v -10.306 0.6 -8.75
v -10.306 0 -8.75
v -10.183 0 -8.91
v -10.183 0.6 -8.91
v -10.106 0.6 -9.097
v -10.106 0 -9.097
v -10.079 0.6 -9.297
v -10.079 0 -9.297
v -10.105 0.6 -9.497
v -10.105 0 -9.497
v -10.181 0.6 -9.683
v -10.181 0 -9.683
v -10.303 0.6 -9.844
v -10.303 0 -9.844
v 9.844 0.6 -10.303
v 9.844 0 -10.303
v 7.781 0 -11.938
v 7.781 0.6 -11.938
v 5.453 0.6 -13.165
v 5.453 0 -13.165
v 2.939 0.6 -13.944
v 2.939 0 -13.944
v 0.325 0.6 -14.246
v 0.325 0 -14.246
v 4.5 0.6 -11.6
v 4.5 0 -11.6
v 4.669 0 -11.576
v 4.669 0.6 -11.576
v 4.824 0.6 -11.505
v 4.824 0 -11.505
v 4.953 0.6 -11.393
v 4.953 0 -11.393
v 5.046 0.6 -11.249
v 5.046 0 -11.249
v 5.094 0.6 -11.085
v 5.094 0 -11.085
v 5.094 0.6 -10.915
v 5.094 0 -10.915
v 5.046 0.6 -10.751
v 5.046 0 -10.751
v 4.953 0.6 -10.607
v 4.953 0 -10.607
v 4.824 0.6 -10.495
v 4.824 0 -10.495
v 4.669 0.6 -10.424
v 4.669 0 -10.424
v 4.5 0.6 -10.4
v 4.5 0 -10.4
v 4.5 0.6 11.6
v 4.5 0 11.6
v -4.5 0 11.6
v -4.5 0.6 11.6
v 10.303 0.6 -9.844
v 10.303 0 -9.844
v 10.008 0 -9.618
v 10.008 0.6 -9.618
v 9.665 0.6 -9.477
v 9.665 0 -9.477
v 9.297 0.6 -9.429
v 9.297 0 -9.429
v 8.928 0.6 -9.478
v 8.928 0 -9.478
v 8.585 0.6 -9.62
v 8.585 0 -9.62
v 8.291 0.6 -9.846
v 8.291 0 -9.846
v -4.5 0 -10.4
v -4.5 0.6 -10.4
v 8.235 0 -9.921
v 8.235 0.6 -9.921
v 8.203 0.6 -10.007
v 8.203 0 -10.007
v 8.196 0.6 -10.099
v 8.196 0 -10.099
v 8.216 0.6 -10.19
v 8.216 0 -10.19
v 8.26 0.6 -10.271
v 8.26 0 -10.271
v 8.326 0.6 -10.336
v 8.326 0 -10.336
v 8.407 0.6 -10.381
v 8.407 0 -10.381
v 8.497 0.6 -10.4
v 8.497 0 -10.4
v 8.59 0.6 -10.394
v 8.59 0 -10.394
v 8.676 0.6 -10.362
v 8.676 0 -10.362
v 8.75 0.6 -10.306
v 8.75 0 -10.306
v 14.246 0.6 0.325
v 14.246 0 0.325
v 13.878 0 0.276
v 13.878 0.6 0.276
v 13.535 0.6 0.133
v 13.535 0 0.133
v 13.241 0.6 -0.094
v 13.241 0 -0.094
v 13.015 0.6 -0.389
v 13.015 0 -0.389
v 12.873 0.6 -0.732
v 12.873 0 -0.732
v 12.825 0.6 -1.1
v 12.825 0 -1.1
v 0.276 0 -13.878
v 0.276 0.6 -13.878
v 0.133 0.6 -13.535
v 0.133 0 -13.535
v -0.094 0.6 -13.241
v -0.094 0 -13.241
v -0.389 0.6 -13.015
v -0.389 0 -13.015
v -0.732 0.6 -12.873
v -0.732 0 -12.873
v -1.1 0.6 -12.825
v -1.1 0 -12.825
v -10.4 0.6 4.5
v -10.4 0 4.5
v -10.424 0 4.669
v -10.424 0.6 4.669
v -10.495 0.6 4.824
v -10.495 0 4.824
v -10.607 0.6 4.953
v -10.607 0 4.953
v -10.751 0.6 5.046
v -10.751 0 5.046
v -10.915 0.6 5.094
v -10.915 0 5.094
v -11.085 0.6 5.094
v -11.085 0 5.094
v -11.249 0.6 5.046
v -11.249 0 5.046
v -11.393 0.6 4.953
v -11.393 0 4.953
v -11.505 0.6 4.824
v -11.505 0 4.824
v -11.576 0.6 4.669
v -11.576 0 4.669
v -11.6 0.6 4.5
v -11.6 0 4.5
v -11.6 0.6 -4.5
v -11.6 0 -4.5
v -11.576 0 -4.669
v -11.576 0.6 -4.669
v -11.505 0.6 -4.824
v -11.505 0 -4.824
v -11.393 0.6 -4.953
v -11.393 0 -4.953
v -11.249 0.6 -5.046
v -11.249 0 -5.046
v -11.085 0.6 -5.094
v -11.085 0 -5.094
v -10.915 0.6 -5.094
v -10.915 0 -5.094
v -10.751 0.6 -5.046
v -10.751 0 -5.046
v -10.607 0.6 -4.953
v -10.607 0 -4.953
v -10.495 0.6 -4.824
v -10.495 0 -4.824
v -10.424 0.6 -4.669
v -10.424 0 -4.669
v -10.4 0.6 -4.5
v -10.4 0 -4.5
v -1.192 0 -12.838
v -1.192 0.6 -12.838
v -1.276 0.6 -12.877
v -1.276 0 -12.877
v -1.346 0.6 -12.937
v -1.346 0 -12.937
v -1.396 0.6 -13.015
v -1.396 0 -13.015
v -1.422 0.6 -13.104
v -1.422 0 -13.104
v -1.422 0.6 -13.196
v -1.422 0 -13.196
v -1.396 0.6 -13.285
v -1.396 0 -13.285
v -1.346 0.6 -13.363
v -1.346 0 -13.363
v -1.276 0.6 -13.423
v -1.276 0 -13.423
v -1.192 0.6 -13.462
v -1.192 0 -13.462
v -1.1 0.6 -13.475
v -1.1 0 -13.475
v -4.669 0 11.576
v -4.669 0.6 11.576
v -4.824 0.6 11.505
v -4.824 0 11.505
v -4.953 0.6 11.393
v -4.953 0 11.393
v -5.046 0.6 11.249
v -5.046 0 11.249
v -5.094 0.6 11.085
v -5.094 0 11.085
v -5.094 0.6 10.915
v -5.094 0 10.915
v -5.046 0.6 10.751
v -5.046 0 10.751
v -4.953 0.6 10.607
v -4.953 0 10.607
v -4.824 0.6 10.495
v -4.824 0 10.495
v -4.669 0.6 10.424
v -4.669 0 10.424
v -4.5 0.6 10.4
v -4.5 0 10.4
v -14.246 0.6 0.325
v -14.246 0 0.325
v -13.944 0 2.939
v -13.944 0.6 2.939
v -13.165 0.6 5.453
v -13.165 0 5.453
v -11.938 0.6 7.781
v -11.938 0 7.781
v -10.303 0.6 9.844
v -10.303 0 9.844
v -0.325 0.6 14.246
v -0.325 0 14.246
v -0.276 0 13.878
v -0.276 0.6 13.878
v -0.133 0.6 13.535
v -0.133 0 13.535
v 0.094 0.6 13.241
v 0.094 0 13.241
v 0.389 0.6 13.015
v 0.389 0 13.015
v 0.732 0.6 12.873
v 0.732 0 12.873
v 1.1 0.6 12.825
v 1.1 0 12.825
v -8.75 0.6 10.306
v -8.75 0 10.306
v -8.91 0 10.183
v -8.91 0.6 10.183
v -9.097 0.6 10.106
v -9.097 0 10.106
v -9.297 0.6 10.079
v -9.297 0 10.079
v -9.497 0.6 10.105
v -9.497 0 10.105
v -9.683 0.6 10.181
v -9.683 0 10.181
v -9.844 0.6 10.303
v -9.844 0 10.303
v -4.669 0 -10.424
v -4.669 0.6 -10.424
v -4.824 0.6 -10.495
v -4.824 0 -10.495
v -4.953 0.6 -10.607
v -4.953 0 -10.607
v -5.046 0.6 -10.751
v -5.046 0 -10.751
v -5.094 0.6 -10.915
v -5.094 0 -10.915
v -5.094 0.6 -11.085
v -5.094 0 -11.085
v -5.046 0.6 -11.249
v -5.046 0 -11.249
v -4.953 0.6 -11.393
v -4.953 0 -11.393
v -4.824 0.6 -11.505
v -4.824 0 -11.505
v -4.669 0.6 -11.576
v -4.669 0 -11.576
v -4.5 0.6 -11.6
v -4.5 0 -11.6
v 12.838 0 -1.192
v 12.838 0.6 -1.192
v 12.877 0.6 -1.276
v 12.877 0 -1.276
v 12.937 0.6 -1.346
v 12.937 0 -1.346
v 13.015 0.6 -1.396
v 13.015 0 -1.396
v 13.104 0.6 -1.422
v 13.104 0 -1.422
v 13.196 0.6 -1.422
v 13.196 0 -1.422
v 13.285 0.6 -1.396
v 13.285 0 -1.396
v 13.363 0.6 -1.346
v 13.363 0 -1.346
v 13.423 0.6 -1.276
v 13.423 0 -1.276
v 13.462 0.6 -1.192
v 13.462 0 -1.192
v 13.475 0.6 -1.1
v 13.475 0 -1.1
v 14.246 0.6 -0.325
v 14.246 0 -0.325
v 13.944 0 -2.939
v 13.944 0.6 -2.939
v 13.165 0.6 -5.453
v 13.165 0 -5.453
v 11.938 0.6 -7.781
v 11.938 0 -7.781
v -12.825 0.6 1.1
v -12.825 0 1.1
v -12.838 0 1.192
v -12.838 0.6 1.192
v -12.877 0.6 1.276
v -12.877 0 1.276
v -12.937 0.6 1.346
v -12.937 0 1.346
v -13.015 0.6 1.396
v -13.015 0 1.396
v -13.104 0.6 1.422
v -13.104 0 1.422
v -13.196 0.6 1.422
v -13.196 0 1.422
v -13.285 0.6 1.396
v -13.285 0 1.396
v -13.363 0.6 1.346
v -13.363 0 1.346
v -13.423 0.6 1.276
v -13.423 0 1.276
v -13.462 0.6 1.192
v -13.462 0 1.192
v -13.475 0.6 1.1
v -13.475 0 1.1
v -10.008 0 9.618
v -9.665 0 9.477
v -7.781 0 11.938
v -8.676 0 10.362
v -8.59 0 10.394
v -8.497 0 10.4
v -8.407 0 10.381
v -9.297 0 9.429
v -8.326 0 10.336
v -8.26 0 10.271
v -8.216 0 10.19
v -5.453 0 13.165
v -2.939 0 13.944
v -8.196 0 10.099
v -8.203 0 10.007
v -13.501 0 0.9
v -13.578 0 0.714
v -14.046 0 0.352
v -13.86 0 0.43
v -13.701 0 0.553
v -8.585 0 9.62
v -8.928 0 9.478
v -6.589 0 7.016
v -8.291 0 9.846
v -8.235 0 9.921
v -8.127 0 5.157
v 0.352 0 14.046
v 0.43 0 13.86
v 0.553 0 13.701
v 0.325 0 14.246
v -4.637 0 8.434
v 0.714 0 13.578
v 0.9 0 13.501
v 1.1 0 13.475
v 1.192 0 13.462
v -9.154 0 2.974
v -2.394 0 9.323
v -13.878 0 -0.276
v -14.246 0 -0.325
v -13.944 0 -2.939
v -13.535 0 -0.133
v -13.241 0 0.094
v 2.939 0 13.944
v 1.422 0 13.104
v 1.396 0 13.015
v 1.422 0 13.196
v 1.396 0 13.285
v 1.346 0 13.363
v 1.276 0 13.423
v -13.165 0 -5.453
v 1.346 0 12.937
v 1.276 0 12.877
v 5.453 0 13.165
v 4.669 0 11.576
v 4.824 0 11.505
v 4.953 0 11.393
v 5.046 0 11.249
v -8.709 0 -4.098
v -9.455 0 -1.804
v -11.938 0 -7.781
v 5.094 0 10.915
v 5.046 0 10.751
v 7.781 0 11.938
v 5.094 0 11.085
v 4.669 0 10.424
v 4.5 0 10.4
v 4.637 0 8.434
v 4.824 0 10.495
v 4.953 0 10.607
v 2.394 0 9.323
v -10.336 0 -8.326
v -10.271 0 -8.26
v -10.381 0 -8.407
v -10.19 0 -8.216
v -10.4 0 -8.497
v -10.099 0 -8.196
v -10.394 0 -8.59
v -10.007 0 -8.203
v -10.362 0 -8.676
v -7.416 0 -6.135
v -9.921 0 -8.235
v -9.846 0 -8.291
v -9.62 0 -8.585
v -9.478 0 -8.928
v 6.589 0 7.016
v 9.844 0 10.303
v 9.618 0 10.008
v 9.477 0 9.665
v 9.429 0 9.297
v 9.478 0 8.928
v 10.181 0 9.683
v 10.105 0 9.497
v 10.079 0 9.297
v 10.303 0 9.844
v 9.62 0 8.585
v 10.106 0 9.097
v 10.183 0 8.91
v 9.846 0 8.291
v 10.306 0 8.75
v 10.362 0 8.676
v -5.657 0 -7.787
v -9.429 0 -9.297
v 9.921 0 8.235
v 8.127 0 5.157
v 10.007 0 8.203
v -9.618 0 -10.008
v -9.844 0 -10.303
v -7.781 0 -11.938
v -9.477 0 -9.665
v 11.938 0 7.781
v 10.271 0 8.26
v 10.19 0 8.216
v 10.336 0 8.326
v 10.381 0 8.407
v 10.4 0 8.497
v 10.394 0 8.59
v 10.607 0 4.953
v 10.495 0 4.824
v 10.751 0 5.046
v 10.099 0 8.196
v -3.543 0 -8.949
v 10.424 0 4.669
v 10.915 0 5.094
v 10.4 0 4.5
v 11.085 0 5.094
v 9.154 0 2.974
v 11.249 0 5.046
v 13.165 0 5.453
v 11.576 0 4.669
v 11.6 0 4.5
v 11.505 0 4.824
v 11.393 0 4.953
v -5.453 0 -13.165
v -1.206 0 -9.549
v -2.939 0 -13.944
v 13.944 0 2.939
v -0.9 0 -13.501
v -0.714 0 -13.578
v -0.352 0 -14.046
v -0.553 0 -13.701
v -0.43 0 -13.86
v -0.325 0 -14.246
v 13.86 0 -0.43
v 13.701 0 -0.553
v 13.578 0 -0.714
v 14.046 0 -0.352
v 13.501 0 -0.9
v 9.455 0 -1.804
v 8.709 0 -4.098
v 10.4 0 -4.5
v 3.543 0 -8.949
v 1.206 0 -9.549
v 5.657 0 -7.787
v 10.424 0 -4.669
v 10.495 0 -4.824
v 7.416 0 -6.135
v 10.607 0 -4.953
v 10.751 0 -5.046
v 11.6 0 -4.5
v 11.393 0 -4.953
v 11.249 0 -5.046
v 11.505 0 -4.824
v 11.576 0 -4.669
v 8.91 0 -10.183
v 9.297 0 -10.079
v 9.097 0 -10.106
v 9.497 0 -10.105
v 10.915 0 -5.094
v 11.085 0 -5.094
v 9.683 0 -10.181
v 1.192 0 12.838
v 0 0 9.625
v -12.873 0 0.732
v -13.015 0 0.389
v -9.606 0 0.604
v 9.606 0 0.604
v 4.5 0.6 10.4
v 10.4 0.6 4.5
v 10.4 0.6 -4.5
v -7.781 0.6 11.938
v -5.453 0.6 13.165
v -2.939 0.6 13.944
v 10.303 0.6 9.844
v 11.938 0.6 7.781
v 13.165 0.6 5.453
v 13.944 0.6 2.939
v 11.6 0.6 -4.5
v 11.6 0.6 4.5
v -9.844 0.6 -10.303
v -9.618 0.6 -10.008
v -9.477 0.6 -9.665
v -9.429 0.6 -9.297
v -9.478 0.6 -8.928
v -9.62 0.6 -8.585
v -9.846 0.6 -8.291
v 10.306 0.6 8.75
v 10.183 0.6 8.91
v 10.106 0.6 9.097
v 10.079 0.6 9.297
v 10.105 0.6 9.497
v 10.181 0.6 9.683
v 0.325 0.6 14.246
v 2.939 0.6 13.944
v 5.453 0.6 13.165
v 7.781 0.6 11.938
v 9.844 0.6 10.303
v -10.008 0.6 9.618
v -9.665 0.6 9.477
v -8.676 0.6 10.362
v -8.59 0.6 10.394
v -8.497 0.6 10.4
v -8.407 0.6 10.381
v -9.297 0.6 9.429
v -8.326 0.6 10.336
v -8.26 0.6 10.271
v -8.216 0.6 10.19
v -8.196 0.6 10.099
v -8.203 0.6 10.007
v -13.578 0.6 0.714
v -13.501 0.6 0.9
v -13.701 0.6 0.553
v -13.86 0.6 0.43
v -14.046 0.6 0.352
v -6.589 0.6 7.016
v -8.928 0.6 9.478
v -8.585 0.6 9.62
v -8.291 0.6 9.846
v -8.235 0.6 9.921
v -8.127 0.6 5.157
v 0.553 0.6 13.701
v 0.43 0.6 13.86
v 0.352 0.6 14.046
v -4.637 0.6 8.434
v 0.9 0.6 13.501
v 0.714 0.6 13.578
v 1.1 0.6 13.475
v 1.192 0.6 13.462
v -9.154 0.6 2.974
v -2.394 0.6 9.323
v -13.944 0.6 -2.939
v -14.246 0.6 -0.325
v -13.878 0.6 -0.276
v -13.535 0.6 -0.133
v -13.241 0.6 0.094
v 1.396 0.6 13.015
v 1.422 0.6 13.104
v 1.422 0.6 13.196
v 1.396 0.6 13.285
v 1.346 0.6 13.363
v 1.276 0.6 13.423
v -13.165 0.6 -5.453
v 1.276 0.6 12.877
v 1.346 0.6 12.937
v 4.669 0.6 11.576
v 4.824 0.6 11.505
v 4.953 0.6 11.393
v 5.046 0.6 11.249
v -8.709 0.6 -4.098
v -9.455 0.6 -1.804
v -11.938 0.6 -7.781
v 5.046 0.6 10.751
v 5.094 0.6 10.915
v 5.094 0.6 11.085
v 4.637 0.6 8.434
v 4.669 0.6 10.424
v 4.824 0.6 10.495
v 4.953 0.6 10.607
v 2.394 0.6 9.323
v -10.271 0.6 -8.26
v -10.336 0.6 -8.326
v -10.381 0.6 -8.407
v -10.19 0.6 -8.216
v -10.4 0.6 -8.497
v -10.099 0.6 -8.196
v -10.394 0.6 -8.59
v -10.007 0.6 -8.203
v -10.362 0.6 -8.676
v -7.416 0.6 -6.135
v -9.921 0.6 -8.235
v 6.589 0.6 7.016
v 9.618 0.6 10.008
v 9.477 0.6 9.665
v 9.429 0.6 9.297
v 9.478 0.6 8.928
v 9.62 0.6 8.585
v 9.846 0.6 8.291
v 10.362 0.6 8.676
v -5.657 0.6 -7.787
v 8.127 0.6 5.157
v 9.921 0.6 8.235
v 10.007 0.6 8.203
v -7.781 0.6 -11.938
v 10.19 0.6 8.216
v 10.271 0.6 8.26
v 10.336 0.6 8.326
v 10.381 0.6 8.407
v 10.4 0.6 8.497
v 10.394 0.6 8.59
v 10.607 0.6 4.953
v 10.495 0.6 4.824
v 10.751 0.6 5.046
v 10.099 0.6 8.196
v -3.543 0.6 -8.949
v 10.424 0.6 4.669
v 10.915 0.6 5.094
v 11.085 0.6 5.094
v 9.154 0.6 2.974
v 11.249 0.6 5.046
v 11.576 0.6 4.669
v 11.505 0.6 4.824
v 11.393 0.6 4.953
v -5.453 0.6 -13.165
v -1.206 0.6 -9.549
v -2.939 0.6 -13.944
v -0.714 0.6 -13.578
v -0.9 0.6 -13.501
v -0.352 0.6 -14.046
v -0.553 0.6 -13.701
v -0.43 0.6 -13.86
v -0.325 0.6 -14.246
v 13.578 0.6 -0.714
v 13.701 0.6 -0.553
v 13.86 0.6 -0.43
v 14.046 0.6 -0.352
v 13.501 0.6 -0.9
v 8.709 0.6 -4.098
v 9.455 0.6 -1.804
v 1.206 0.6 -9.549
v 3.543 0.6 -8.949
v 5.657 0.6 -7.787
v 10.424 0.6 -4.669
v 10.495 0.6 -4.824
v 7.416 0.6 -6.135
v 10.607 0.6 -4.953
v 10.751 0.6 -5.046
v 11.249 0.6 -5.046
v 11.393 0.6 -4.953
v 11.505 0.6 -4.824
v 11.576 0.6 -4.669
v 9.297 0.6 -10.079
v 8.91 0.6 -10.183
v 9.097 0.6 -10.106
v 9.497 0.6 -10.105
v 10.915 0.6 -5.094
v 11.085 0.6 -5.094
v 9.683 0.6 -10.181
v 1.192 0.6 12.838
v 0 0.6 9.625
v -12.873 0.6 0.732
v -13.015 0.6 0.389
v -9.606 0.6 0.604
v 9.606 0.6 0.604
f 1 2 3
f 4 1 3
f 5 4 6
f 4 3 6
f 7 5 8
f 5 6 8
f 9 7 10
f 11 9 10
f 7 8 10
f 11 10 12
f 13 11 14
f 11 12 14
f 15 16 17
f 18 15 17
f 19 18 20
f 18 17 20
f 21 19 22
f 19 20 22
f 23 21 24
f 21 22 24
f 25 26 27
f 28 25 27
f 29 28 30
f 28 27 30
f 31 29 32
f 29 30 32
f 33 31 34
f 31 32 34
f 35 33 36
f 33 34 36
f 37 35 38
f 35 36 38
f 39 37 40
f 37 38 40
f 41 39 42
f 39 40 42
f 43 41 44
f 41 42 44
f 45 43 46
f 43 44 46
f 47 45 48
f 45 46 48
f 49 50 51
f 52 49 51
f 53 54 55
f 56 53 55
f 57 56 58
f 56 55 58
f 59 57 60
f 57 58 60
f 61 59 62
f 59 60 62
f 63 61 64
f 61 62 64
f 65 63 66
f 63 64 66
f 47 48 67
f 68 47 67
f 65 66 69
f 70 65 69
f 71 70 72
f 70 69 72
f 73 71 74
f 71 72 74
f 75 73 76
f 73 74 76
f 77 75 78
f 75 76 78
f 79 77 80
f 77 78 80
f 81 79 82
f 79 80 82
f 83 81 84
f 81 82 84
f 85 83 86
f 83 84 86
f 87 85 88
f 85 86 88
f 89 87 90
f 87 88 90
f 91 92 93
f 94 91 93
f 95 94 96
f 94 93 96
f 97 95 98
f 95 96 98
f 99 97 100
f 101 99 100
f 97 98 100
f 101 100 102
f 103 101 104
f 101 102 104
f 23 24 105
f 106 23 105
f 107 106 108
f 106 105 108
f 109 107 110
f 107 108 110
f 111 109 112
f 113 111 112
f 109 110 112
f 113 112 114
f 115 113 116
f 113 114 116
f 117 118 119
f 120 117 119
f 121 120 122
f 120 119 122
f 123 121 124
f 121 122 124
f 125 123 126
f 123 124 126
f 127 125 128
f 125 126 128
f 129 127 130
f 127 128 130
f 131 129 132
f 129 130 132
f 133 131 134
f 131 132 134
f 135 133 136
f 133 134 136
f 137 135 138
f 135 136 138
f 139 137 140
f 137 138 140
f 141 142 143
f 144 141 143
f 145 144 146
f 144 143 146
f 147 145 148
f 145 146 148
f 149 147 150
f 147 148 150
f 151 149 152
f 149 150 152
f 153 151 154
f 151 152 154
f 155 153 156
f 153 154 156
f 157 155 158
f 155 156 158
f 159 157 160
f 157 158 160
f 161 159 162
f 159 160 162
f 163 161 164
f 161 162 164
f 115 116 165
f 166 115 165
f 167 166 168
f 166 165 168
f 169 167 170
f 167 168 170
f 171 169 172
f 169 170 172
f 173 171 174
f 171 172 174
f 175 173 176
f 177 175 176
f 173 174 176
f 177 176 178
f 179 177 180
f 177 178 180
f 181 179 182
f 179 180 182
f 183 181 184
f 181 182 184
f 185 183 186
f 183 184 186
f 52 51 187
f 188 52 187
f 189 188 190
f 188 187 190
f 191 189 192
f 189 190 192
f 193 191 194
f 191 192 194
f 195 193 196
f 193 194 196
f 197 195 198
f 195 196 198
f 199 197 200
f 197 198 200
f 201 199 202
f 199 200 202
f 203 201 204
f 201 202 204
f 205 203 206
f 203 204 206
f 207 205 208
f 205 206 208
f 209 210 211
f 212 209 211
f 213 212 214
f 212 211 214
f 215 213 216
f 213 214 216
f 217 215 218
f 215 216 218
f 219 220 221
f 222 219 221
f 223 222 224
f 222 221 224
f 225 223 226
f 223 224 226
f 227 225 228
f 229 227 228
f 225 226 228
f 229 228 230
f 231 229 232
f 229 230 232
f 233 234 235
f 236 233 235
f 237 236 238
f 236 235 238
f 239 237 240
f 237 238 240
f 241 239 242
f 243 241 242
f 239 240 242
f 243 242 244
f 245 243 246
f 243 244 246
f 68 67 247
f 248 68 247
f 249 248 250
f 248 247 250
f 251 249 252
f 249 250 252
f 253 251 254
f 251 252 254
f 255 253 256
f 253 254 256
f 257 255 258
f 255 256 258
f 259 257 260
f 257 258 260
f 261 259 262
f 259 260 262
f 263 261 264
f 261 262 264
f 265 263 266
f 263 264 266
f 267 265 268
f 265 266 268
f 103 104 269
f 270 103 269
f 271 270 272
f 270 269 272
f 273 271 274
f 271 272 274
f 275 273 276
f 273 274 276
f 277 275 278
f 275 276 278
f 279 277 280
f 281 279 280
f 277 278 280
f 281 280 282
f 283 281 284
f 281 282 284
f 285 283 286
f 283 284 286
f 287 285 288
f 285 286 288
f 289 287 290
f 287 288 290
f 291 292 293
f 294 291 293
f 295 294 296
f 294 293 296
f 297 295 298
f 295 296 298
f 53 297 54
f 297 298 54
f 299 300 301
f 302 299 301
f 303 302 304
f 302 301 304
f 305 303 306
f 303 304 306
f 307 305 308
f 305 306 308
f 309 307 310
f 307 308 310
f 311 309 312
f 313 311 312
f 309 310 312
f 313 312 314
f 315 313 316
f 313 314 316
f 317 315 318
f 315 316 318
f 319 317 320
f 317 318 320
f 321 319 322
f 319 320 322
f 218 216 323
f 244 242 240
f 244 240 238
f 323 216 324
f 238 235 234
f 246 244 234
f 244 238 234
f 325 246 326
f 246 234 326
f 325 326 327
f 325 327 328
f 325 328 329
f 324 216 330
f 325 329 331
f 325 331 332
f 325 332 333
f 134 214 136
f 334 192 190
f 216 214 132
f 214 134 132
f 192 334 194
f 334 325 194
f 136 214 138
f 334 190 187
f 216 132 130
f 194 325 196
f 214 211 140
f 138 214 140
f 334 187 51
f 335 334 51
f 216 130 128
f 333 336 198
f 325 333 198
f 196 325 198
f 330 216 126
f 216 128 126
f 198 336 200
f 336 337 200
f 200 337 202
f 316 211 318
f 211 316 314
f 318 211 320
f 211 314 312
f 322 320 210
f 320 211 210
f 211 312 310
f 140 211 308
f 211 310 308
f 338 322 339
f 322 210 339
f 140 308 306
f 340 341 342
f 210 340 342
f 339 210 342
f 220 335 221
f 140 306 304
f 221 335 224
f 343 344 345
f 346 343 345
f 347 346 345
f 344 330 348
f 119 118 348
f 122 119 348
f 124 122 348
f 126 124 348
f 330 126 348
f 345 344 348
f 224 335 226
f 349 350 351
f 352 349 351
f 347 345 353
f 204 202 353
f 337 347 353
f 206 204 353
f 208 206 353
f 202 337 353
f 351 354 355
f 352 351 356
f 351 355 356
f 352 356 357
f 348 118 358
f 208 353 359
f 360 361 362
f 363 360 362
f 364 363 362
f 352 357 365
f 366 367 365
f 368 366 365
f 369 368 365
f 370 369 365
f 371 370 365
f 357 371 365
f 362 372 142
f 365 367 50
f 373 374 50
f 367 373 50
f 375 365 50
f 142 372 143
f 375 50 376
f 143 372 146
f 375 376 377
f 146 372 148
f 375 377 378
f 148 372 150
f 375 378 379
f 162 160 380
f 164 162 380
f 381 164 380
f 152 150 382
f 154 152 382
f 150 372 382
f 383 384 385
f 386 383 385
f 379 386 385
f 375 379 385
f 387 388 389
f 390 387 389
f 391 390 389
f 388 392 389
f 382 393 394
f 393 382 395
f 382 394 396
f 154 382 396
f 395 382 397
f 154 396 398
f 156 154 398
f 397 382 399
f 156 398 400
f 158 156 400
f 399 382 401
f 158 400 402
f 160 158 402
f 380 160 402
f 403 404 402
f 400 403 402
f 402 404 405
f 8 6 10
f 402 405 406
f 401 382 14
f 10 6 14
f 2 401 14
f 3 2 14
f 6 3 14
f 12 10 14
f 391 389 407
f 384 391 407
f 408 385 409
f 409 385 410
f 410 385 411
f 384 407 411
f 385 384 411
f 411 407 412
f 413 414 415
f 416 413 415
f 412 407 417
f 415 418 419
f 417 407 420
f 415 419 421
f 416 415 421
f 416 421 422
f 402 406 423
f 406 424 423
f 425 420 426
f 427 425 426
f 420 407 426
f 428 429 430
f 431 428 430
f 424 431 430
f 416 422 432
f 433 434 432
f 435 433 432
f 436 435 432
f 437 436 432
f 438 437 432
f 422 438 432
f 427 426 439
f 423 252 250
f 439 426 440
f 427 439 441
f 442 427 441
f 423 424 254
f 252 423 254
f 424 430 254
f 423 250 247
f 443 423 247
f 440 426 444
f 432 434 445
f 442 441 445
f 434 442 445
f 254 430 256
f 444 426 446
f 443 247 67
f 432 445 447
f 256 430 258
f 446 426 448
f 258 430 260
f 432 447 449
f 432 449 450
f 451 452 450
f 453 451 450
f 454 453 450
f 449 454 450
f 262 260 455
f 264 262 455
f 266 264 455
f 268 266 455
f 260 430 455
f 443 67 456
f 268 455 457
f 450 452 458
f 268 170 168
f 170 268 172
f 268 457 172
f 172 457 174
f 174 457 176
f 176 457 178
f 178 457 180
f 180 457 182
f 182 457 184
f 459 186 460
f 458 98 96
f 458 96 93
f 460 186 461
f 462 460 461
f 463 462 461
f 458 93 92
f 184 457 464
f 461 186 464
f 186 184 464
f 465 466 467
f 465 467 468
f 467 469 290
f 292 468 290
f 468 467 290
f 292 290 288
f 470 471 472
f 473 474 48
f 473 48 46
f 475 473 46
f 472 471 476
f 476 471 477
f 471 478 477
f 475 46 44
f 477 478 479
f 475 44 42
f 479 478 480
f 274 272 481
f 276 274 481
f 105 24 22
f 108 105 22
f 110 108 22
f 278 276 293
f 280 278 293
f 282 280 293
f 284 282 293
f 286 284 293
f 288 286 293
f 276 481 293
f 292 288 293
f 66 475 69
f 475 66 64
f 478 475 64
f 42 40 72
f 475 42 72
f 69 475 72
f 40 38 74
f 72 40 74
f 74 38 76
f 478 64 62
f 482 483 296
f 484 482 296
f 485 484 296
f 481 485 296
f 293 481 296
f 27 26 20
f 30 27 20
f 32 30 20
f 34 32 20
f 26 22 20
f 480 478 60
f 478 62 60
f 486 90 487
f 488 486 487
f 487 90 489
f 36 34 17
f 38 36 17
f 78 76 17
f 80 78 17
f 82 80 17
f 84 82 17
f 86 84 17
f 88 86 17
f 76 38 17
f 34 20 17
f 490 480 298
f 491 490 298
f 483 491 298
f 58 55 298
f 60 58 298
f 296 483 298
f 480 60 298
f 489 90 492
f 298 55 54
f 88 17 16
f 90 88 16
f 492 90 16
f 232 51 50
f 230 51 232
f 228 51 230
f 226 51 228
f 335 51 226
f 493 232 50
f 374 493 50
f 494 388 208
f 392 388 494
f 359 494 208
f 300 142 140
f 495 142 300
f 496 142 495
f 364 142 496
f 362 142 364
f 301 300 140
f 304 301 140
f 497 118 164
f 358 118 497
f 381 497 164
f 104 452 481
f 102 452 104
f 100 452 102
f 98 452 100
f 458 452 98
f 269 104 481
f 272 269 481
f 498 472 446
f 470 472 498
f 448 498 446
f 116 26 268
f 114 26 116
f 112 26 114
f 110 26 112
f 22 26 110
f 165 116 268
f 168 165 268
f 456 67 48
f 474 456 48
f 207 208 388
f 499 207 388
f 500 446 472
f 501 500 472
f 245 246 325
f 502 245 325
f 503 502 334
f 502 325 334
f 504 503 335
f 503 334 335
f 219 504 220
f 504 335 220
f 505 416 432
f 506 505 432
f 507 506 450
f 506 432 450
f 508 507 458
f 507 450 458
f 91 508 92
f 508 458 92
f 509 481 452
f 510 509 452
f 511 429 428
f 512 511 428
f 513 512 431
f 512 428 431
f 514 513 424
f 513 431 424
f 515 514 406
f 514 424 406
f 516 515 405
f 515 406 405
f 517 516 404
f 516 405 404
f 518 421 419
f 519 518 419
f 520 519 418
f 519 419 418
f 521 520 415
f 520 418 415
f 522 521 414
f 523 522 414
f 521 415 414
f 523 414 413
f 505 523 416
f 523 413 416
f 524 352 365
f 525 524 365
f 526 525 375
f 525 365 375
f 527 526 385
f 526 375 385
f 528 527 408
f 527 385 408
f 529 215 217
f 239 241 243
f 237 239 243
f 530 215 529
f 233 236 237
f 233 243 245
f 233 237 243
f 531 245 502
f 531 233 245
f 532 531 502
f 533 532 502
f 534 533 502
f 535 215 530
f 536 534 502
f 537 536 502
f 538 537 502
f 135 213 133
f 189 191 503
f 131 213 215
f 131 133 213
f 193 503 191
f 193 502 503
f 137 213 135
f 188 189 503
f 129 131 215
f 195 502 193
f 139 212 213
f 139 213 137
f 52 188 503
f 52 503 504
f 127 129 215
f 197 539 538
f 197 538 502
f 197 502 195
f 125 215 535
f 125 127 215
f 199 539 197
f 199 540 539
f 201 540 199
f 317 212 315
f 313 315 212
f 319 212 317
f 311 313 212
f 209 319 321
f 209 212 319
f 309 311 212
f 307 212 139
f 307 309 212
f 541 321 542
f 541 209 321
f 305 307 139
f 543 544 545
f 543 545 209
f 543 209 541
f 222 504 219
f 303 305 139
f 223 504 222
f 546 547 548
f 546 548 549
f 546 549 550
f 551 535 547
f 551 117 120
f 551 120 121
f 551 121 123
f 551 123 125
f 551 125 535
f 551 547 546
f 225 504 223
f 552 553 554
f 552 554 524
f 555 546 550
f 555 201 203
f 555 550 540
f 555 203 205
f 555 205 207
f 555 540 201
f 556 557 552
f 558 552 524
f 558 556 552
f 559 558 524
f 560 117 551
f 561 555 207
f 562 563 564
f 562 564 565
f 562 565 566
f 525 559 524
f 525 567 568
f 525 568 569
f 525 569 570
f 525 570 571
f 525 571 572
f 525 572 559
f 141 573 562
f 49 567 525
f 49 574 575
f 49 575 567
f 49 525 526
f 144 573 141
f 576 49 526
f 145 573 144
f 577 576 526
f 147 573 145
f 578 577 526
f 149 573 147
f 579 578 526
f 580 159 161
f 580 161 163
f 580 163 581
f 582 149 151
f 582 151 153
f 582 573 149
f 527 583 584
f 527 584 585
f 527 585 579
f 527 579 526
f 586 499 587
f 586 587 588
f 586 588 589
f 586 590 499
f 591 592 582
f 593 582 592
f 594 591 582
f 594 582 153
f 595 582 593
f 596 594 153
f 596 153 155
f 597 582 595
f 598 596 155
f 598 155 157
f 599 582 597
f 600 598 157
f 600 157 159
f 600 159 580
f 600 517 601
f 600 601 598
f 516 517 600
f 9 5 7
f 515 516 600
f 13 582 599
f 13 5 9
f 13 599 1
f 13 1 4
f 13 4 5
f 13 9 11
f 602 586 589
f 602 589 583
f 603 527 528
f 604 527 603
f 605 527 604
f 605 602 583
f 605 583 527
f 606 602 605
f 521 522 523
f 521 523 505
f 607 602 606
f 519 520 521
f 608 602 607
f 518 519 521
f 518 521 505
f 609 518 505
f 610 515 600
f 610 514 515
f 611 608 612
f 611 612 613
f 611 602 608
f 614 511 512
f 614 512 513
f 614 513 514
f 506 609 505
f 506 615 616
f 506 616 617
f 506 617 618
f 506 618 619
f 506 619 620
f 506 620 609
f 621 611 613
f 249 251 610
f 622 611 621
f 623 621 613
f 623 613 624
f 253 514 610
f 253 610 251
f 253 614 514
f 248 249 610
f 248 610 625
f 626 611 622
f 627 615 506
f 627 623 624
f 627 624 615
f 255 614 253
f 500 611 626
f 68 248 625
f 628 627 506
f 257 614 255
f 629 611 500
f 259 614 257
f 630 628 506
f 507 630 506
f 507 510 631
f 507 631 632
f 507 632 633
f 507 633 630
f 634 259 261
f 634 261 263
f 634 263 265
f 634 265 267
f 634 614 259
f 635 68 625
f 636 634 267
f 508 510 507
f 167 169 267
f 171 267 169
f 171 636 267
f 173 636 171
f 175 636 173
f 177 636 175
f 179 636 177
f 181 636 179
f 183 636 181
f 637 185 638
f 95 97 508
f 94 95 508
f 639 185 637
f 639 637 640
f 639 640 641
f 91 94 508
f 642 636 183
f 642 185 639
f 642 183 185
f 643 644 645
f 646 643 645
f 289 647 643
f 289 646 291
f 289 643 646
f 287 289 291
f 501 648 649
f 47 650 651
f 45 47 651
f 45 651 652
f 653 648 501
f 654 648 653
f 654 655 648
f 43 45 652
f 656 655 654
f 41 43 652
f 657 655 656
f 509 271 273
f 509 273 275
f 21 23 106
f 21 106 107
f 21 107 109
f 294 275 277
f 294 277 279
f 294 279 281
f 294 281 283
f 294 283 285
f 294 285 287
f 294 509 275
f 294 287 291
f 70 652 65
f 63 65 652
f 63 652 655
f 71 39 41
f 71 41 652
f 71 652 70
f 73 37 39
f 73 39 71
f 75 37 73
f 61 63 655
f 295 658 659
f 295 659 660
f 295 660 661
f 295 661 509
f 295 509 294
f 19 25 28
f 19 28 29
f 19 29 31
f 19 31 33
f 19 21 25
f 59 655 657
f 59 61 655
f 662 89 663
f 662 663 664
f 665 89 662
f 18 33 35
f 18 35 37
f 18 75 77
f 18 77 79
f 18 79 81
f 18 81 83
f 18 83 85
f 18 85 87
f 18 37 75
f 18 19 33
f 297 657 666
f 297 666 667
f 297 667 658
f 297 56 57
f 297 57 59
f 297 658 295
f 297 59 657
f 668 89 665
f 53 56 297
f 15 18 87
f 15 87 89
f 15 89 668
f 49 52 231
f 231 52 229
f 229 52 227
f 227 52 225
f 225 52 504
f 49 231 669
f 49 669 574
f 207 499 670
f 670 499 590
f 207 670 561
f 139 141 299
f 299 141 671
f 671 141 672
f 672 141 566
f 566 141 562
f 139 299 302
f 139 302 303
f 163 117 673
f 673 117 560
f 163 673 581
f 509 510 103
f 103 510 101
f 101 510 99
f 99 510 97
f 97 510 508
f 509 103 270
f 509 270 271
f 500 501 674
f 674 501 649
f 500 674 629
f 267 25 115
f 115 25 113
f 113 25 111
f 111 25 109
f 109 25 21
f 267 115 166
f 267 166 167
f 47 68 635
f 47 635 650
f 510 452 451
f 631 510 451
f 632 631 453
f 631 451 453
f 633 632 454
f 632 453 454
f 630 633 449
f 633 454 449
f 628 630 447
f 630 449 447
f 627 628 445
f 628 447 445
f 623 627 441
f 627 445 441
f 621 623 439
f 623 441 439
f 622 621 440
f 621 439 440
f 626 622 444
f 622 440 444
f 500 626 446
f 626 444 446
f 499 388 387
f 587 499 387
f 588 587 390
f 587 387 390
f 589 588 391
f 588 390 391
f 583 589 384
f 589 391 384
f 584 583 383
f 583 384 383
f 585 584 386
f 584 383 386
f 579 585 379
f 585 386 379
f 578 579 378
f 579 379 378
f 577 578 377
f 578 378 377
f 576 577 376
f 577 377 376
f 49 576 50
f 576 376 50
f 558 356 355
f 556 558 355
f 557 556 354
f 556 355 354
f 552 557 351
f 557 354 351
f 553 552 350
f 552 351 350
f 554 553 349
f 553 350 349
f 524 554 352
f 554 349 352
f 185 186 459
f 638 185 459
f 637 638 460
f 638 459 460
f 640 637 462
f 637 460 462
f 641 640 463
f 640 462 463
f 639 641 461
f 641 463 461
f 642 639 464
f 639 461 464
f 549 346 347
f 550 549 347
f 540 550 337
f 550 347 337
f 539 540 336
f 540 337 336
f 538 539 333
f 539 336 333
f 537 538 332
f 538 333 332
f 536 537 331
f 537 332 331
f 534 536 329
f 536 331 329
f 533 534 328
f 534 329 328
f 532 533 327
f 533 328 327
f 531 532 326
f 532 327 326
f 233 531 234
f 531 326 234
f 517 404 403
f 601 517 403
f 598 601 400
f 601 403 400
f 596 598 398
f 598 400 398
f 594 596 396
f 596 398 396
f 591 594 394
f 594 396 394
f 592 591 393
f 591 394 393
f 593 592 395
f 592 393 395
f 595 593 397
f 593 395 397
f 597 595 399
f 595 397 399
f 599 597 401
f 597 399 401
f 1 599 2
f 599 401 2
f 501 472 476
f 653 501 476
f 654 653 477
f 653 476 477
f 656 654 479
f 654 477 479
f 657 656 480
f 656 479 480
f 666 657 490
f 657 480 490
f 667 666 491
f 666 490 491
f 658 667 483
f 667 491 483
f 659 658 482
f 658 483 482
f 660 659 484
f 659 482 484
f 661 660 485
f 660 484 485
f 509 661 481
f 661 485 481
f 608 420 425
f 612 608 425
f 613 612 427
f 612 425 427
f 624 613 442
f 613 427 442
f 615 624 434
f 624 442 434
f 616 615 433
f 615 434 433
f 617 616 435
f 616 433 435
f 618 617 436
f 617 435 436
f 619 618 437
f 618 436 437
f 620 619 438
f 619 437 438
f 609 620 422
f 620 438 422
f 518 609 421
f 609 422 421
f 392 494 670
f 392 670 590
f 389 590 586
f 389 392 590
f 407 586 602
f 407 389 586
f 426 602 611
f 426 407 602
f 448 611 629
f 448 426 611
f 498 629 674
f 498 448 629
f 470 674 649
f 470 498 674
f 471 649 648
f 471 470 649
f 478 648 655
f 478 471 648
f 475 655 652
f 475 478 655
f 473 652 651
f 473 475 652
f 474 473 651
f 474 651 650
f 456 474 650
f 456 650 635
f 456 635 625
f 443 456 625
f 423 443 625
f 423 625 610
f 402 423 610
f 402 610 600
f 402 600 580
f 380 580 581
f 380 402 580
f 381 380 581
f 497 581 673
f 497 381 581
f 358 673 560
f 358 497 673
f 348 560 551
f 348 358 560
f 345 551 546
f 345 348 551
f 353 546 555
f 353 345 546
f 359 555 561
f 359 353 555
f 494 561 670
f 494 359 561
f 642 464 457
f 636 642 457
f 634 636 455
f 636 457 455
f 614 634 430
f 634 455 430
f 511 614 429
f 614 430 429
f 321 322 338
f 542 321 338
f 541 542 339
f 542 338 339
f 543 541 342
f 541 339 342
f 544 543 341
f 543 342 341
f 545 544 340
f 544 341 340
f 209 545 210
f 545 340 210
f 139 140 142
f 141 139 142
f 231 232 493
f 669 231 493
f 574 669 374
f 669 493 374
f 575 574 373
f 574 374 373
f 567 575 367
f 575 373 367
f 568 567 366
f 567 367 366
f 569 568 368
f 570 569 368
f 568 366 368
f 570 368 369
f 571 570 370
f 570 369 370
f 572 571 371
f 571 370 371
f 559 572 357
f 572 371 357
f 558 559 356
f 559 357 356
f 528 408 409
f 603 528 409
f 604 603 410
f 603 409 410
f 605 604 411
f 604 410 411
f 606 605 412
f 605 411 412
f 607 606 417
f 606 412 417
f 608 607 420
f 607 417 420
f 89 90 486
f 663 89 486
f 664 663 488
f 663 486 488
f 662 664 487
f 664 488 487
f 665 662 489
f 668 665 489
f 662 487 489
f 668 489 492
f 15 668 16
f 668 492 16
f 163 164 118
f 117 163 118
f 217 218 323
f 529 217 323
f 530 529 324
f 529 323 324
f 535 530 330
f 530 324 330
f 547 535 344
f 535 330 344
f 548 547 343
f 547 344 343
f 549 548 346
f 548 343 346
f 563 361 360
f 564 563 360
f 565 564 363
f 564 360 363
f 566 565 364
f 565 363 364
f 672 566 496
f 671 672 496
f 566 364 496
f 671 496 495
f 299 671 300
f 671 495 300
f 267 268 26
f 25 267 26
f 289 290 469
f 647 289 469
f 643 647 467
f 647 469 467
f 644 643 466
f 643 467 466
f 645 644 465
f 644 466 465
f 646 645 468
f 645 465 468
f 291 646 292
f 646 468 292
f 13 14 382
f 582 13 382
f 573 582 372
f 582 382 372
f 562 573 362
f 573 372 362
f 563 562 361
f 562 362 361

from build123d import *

# Parameters (mm, degrees)
SKETCH1_R           = 9.625
BOSS_EXTRUDE1_DEPTH = 0.6


with BuildPart() as part:
    # Sketch1 → Boss-Extrude1 (new body)
    with BuildSketch(Plane(origin=(0, 0, 0), x_dir=(1, 0, 0), z_dir=(0, 1, 0))):
        with BuildLine():
            ThreePointArc((13.474991136, 1.1), (13.700677051, 0.553298036), (14.246293378, 0.325))
            ThreePointArc((14.246293378, 0.325), (13.165283338, 5.453238911), (10.303460358, 9.84384095))
            ThreePointArc((10.303460358, 9.84384095), (9.29660086, 9.429085476), (8.290823601, 9.846458519))
            ThreePointArc((8.290823601, 9.846458519), (8.290823601, 10.306075068), (8.750440149, 10.306075068))
            ThreePointArc((8.750440149, 10.306075068), (9.296600856, 10.079082443), (9.84384095, 10.303460358))
            ThreePointArc((9.84384095, 10.303460358), (5.453238911, 13.165283338), (0.325, 14.246293378))
            ThreePointArc((0.325, 14.246293378), (-0.09368077, 13.24105979), (-1.1, 12.824995179))
            ThreePointArc((-1.1, 12.824995179), (-1.424997978, 13.149993158), (-1.1, 13.474991136))
            ThreePointArc((-1.1, 13.474991136), (-0.553298036, 13.700677051), (-0.325, 14.246293378))
            ThreePointArc((-0.325, 14.246293378), (-5.453238911, 13.165283338), (-9.84384095, 10.303460358))
            ThreePointArc((-9.84384095, 10.303460358), (-9.429085476, 9.29660086), (-9.846458519, 8.290823601))
            ThreePointArc((-9.846458519, 8.290823601), (-10.306075068, 8.290823601), (-10.306075068, 8.750440149))
            ThreePointArc((-10.306075068, 8.750440149), (-10.079082443, 9.296600856), (-10.303460358, 9.84384095))
            ThreePointArc((-10.303460358, 9.84384095), (-13.165283338, 5.453238911), (-14.246293378, 0.325))
            ThreePointArc((-14.246293378, 0.325), (-13.24105979, -0.09368077), (-12.824995179, -1.1))
            ThreePointArc((-12.824995179, -1.1), (-13.149993158, -1.424997978), (-13.474991136, -1.1))
            ThreePointArc((-13.474991136, -1.1), (-13.700677051, -0.553298036), (-14.246293378, -0.325))
            ThreePointArc((-14.246293378, -0.325), (-13.165283338, -5.453238911), (-10.303460358, -9.84384095))
            ThreePointArc((-10.303460358, -9.84384095), (-9.29660086, -9.429085476), (-8.290823601, -9.846458519))
            ThreePointArc((-8.290823601, -9.846458519), (-8.290823601, -10.306075068), (-8.750440149, -10.306075068))
            ThreePointArc((-8.750440149, -10.306075068), (-9.296600856, -10.079082443), (-9.84384095, -10.303460358))
            ThreePointArc((-9.84384095, -10.303460358), (-5.453238911, -13.165283338), (-0.325, -14.246293378))
            ThreePointArc((-0.325, -14.246293378), (0.09368077, -13.24105979), (1.1, -12.824995179))
            ThreePointArc((1.1, -12.824995179), (1.424997978, -13.149993158), (1.1, -13.474991136))
            ThreePointArc((1.1, -13.474991136), (0.553298036, -13.700677051), (0.325, -14.246293378))
            ThreePointArc((0.325, -14.246293378), (5.453238911, -13.165283338), (9.84384095, -10.303460358))
            ThreePointArc((9.84384095, -10.303460358), (9.429085476, -9.29660086), (9.846458519, -8.290823601))
            ThreePointArc((9.846458519, -8.290823601), (10.306075068, -8.290823601), (10.306075068, -8.750440149))
            ThreePointArc((10.306075068, -8.750440149), (10.079082443, -9.296600856), (10.303460358, -9.84384095))
            ThreePointArc((10.303460358, -9.84384095), (13.165283338, -5.453238911), (14.246293378, -0.325))
            ThreePointArc((14.246293378, -0.325), (13.24105979, 0.09368077), (12.824995179, 1.1))
            ThreePointArc((12.824995179, 1.1), (13.149993158, 1.424997978), (13.474991136, 1.1))
        make_face()
        with BuildLine():
            ThreePointArc((-4.5, -11.6), (-5.1, -11), (-4.5, -10.4))
            Line((-4.5, -10.4), (4.5, -10.4))
            ThreePointArc((4.5, -10.4), (5.1, -11), (4.5, -11.6))
            Line((4.5, -11.6), (-4.5, -11.6))
        make_face(mode=Mode.SUBTRACT)
        with BuildLine():
            ThreePointArc((-11.6, 4.5), (-11, 5.1), (-10.4, 4.5))
            Line((-10.4, 4.5), (-10.4, -4.5))
            ThreePointArc((-10.4, -4.5), (-11, -5.1), (-11.6, -4.5))
            Line((-11.6, -4.5), (-11.6, 4.5))
        make_face(mode=Mode.SUBTRACT)
        with Locations(Location((0, 0, 0), (0, 0, 270))):
            Circle(SKETCH1_R, mode=Mode.SUBTRACT)
        with BuildLine():
            ThreePointArc((11.6, -4.5), (11, -5.1), (10.4, -4.5))
            Line((10.4, -4.5), (10.4, 4.5))
            ThreePointArc((10.4, 4.5), (11, 5.1), (11.6, 4.5))
            Line((11.6, 4.5), (11.6, -4.5))
        make_face(mode=Mode.SUBTRACT)
        with BuildLine():
            ThreePointArc((4.5, 11.6), (5.1, 11), (4.5, 10.4))
            Line((4.5, 10.4), (-4.5, 10.4))
            ThreePointArc((-4.5, 10.4), (-5.1, 11), (-4.5, 11.6))
            Line((-4.5, 11.6), (4.5, 11.6))
        make_face(mode=Mode.SUBTRACT)
    extrude(amount=BOSS_EXTRUDE1_DEPTH)


solid = part.part
